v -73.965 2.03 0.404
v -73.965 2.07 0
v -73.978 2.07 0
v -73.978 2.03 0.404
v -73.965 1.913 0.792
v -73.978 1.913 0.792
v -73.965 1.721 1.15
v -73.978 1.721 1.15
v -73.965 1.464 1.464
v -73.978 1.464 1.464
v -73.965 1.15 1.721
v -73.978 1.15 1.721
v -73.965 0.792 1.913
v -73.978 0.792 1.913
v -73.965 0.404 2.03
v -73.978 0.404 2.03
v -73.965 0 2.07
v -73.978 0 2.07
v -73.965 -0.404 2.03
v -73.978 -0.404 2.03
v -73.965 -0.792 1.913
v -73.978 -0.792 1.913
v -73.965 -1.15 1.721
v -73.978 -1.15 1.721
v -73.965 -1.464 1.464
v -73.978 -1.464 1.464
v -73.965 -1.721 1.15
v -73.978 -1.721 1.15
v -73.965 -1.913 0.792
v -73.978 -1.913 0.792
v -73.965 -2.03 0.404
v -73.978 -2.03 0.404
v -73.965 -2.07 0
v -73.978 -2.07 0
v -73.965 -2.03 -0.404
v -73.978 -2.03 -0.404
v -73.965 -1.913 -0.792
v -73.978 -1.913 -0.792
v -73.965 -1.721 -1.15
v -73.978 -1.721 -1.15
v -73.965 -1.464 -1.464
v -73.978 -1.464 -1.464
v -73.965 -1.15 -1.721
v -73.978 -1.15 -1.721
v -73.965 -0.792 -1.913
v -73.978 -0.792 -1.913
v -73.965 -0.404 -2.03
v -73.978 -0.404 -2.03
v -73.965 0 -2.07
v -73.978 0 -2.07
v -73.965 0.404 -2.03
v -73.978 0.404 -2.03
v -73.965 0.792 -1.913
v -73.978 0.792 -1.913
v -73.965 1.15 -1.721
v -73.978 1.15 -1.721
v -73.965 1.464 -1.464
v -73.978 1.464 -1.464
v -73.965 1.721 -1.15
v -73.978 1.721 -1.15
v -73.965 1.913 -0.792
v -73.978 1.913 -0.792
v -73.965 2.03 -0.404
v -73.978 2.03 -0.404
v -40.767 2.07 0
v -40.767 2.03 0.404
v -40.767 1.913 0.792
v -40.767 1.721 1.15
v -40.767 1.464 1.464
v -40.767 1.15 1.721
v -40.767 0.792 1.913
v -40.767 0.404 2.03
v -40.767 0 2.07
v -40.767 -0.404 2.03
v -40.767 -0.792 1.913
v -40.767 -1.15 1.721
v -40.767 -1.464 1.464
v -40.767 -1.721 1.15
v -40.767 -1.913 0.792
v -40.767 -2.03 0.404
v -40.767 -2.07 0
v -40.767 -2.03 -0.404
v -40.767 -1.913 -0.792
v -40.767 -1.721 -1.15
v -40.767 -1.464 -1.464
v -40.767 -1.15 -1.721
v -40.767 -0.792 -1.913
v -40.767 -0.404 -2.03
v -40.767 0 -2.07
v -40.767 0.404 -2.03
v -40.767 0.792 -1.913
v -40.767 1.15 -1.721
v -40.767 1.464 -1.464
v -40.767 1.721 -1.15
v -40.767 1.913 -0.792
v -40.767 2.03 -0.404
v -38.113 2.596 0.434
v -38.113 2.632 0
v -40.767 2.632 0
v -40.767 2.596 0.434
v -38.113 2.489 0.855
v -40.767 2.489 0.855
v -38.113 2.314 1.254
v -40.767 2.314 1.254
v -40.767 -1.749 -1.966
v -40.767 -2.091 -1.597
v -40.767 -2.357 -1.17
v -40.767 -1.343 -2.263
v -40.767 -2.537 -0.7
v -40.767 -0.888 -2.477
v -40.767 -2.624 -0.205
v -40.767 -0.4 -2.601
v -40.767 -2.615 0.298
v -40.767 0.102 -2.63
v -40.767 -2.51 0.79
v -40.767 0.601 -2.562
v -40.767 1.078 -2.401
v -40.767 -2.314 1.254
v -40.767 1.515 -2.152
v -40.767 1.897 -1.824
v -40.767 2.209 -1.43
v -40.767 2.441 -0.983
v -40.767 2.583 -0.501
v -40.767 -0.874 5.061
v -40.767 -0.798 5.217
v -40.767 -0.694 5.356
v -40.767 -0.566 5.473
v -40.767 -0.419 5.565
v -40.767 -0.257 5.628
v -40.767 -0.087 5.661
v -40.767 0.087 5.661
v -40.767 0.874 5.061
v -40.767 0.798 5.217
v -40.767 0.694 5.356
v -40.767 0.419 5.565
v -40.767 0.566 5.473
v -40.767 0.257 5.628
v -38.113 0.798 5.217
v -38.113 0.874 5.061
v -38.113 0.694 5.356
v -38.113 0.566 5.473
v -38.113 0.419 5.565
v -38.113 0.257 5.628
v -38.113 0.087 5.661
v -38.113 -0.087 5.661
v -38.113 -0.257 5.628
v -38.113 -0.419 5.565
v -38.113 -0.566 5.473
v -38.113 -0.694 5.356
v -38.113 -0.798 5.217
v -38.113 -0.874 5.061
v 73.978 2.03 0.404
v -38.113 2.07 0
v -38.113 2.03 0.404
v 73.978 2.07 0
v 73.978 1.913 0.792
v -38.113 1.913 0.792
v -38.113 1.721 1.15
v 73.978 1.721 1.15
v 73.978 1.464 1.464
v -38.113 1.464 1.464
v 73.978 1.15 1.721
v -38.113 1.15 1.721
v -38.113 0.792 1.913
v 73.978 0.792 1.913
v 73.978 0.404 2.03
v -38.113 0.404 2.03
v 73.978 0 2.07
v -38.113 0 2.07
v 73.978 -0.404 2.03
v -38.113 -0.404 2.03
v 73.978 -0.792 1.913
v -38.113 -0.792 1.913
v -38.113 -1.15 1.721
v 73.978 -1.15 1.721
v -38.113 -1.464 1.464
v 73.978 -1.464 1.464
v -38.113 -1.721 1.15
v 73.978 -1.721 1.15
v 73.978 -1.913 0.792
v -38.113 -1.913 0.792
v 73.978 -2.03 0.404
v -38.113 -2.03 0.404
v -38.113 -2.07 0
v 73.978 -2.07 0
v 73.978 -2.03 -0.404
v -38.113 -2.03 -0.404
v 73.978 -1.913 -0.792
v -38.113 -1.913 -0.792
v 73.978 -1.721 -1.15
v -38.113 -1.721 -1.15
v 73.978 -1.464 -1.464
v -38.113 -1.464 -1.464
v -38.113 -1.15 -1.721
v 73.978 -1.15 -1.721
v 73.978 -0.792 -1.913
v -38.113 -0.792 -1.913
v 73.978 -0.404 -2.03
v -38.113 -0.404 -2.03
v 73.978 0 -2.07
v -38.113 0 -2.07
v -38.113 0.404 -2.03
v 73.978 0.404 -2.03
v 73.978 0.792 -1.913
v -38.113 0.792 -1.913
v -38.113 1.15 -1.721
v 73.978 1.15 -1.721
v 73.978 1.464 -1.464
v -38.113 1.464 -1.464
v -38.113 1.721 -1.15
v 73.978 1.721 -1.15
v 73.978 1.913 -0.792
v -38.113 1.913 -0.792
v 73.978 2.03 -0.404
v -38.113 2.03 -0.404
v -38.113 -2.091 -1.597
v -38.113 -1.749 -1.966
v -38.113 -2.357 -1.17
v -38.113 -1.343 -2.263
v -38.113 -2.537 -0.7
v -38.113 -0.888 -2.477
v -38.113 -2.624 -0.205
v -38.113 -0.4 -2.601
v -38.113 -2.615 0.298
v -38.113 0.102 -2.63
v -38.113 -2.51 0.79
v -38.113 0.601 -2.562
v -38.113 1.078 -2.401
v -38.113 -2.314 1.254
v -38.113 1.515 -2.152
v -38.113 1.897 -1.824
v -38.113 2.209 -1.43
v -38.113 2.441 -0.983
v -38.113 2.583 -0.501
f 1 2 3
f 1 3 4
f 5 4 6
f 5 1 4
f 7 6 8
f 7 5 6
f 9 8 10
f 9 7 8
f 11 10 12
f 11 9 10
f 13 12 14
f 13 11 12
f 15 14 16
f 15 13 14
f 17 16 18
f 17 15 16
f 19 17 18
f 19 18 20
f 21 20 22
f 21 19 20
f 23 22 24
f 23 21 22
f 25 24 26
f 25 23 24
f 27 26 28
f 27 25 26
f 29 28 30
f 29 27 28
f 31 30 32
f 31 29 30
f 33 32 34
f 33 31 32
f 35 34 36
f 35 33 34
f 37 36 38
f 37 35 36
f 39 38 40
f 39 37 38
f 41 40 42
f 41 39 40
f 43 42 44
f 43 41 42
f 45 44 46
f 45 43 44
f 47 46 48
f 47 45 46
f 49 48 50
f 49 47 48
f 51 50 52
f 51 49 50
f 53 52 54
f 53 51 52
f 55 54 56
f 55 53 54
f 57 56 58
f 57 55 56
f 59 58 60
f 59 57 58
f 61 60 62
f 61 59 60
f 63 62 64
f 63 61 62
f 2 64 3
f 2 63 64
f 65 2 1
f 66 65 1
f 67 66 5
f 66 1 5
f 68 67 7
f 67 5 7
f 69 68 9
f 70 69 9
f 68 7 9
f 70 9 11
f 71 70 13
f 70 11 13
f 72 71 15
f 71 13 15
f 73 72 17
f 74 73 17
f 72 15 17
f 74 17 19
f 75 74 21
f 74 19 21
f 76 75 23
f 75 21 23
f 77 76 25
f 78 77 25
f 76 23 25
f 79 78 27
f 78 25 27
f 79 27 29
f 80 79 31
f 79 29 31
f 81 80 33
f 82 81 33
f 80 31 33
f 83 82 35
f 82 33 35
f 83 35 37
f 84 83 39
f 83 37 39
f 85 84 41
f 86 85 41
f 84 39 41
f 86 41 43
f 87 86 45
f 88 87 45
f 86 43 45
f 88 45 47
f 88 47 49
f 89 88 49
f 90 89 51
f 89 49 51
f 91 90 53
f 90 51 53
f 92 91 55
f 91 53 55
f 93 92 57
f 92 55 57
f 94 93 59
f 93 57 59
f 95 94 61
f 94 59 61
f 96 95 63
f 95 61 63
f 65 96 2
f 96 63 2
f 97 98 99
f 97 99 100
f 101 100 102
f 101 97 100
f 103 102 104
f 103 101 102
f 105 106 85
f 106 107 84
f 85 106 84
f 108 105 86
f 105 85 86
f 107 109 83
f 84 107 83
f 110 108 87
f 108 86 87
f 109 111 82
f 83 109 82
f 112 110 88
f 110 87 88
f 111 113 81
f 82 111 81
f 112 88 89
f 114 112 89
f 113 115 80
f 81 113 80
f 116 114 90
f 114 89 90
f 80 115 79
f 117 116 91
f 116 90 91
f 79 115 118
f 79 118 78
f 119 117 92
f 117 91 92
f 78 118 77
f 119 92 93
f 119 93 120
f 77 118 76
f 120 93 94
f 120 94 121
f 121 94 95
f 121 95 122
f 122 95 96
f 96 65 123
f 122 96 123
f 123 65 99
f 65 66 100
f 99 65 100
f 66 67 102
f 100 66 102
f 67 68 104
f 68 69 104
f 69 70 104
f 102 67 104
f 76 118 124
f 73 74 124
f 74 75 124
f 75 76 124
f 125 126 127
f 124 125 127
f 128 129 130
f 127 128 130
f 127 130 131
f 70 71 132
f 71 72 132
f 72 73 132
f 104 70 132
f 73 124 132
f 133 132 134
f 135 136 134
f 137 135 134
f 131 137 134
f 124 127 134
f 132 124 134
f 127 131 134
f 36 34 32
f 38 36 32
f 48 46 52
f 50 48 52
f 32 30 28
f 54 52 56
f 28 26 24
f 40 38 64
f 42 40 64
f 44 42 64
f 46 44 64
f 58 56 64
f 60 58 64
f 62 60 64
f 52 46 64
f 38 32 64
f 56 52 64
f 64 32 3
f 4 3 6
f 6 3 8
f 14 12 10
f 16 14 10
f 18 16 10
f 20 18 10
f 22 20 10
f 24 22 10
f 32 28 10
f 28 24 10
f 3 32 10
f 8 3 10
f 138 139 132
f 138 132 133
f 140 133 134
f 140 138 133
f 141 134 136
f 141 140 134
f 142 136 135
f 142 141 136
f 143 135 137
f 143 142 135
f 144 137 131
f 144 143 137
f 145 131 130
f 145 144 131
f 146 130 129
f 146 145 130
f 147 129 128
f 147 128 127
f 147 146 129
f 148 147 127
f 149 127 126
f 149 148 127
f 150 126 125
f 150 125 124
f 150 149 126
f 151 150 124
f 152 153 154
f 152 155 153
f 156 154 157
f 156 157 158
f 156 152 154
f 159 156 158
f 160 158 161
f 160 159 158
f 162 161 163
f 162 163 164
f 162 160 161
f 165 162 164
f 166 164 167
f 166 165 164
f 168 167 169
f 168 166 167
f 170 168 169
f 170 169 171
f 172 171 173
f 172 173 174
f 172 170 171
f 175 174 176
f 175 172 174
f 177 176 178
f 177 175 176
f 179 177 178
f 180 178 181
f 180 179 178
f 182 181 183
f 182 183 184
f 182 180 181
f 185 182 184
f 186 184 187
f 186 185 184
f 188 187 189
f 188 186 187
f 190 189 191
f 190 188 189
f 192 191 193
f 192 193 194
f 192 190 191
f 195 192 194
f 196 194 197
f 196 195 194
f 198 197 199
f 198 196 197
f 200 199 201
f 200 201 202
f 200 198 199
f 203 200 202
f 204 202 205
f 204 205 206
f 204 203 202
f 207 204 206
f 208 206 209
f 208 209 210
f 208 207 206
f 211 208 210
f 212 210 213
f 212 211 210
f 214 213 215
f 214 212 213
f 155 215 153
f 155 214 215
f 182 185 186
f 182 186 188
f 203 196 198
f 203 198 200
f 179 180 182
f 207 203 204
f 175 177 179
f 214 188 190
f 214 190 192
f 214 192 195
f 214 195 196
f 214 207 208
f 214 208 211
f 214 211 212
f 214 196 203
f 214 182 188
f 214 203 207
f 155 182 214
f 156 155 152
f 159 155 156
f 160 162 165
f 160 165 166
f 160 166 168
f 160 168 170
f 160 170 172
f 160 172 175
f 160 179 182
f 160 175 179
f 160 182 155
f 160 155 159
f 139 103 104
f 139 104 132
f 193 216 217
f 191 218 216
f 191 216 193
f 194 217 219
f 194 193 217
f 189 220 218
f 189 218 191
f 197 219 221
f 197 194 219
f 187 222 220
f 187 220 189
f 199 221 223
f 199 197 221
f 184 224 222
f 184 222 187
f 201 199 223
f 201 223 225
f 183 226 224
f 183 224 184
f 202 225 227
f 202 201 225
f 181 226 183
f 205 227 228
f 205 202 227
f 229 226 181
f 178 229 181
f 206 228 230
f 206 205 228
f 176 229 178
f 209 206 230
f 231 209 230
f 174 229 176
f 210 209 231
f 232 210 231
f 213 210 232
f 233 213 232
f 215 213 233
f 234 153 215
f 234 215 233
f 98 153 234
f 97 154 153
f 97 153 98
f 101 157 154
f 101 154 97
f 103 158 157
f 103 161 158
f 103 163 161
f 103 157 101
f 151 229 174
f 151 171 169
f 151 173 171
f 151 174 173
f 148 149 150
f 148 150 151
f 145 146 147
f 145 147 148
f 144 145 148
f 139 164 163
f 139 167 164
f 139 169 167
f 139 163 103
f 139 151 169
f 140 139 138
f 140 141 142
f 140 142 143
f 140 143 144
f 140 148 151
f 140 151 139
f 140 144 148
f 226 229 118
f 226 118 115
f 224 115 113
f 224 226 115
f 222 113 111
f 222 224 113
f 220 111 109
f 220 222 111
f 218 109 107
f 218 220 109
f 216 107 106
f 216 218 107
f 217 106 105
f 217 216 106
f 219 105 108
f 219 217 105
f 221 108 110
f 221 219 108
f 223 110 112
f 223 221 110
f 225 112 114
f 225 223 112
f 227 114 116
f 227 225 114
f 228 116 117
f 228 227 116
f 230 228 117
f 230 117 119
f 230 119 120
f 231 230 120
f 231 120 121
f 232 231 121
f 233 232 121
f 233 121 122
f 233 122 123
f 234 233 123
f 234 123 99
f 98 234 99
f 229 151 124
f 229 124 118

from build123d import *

# Parameters (mm, degrees)
F0_R     = 2.0701
F1_DEPTH = 73.9775
F3_DEPTH = 73.9648
F5_DEPTH = 33.1978
F6_DEPTH = 38.1127


with BuildPart() as f1:
    # F0 (on Right) → F1 (new body, symmetric)
    with BuildSketch(Plane.YZ):
        Circle(F0_R)
    extrude(amount=F1_DEPTH, both=True)

    # F2 (on Right) → F3 (join)
    with BuildSketch(Plane.YZ):
        with BuildLine():
            ThreePointArc((-2.3136596952, 1.2537271952), (-0.6466957718, -2.5508111737), (2.6315115552, 0))
            ThreePointArc((2.6315115552, 0), (2.5508111737, 0.6466957718), (2.3136596952, 1.2537271952))
            ThreePointArc((2.3136596952, 1.2537271952), (0, 2.6315115552), (-2.3136596952, 1.2537271952))
        make_face()
        with BuildLine():
            ThreePointArc((-2.3136596952, 1.2537271952), (0, 2.6315115552), (2.3136596952, 1.2537271952))
            Line((2.3136596952, 1.2537271952), (0.8742138073, 5.0605748032))
            ThreePointArc((0.8742138073, 5.0605748032), (0.9193959303, 4.8980330409), (0.9346220049, 4.7300169244))
            ThreePointArc((0.9346220049, 4.7300169244), (-0.1680161165, 3.8106209941), (-0.8742138073, 5.0605748032))
            Line((-0.8742138073, 5.0605748032), (-2.3136596952, 1.2537271952))
        make_face()
        with BuildLine():
            ThreePointArc((0.9346220049, 4.7300169244), (0.9193959303, 4.8980330409), (0.8742138073, 5.0605748032))
            ThreePointArc((0.8742138073, 5.0605748032), (0, 5.6646389293), (-0.8742138073, 5.0605748032))
            ThreePointArc((-0.8742138073, 5.0605748032), (-0.1680161165, 3.8106209941), (0.9346220049, 4.7300169244))
        make_face()
    extrude(amount=-F3_DEPTH)

    # F5 (cut): a face of the model
    f5_faces = [f1.faces().sort_by_distance(p)[0] for p in [
        (-73.9648, 0, -2.5332641506),
    ]]
    extrude(f5_faces, amount=-F5_DEPTH, mode=Mode.SUBTRACT)

    # F6 (cut): a face of the model
    f6_faces = [f1.faces().sort_by_distance(p)[0] for p in [
        (0, 0, -2.5332641506),
    ]]
    extrude(f6_faces, amount=-F6_DEPTH, mode=Mode.SUBTRACT)


solid = f1.part
